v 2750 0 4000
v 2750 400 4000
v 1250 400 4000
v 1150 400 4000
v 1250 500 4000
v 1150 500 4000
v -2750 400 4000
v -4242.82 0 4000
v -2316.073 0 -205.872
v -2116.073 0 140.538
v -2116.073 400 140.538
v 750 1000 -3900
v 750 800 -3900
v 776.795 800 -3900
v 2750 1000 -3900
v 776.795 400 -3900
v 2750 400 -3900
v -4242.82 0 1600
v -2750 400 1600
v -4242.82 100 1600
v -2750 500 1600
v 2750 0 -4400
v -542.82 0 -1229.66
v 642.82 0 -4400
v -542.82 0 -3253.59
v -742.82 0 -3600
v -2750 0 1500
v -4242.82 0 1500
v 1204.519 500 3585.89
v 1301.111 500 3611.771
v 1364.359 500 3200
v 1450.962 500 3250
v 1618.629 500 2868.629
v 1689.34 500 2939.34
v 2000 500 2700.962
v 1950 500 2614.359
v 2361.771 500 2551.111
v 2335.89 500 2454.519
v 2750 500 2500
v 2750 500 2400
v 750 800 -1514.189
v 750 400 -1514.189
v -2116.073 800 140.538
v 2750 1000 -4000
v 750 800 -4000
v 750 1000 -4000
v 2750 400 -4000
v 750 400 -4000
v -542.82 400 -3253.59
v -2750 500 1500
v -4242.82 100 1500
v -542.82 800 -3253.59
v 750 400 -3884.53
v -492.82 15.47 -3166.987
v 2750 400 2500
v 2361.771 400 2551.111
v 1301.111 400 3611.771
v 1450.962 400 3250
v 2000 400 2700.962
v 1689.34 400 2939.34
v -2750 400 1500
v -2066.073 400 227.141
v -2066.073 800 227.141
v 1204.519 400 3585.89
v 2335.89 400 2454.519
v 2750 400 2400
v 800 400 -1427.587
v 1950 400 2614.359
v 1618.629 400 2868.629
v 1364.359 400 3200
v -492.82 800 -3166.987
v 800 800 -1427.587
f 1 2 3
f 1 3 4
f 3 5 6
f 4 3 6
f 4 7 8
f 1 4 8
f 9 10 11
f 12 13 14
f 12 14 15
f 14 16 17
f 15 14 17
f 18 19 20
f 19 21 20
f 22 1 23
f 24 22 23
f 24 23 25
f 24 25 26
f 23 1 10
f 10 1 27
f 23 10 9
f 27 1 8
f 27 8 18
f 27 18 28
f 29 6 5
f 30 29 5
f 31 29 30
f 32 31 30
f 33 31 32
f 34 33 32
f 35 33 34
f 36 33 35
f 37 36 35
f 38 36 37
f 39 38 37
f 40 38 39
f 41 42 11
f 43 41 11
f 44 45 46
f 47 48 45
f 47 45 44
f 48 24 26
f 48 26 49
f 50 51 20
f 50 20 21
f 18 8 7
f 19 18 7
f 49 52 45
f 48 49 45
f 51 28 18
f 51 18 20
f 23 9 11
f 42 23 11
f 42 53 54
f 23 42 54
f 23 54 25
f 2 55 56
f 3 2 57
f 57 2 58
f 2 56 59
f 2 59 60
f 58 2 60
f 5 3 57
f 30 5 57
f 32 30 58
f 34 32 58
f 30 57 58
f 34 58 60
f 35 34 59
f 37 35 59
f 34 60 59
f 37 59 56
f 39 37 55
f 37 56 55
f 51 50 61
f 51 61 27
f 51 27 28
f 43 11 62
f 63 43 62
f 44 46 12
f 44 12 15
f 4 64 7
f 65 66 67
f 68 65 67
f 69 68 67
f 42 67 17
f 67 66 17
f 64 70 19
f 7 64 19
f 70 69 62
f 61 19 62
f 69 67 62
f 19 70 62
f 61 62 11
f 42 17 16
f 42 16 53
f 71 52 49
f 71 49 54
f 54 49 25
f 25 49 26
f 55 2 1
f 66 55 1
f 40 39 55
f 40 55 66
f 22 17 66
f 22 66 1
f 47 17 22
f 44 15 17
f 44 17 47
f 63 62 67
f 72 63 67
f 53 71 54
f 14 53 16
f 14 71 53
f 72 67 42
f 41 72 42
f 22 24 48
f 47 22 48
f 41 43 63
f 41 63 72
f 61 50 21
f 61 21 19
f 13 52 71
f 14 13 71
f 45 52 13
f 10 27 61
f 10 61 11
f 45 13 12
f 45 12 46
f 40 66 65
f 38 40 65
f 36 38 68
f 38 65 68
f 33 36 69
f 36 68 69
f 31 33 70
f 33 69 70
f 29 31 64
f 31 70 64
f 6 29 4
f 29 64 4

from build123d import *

# Parameters (mm, degrees)
EXTRUDE_1_DEPTH              = 400
EXTRUDE_2_DEPTH              = 100
SKETCH_3_W                   = 2000
SKETCH_3_H                   = 100
EXTRUDE_3_DEPTH              = 600
EXTRUDE_4_DEPTH              = 400
EXTRUDE_5_DEPTH              = 2500
EXTRUDE_6_DEPTH              = 100
EXTRUDE_7_REACH              = 6699.625
EXTRUDE_8_REACH              = 9240.058
EXTRUDE_10_REACH             = 8119.853
EXTRUDE_11_DEPTH             = 1492.820323
EXTRUDE_11_DIRECTION_2_REACH = 8492.6
SKETCH_12_W                  = 1492.820323027
SKETCH_12_H                  = 800
EXTRUDE_12_DEPTH             = 100


with BuildPart() as part:
    # 草图1 → 凸台-拉伸1 (new body)
    with BuildSketch(Plane(origin=(0, 0, 0), x_dir=(1, 0, 0), z_dir=(0, 1, 0))):
        Polygon((-2750, -1500), (-2116.072607389, -140.538319445), (750, 1514.189471948), (750, 4000), (2750, 4000), (2750, -4000), (-2750, -4000), align=None)
    extrude(amount=EXTRUDE_1_DEPTH)

    # 草图2 → 凸台-拉伸2 (add)
    with BuildSketch(Plane(origin=(0, 400, 0), x_dir=(1, 0, 0), z_dir=(0, 1, 0))):
        with BuildLine():
            Line((1150, -4000), (1250, -4000))
            ThreePointArc((1250, -4000), (1689.33982822, -2939.33982822), (2750, -2500))
            Line((2750, -2500), (2750, -2400))
            ThreePointArc((2750, -2400), (1618.629150102, -2868.629150102), (1150, -4000))
        make_face()
    extrude(amount=EXTRUDE_2_DEPTH)

    # 草图3 → 凸台-拉伸3 (add)
    with BuildSketch(Plane(origin=(0, 400, 0), x_dir=(1, 0, 0), z_dir=(0, 1, 0))):
        with Locations((1750, 3950)):
            Rectangle(SKETCH_3_W, SKETCH_3_H)
    extrude(amount=EXTRUDE_3_DEPTH)

    # 草图4 → 凸台-拉伸4 (add)
    with BuildSketch(Plane(origin=(0, 400, 0), x_dir=(1, 0, 0), z_dir=(0, 1, 0))):
        Polygon((750, 1514.189471948), (-2116.072607389, -140.538319445), (-2066.072607389, -227.140859823), (800, 1427.58693157), align=None)
    extrude(amount=EXTRUDE_4_DEPTH)

    # 草图5 → 凸台-拉伸5 (add)
    with BuildSketch(Plane.XY.offset(4000)):
        Polygon((-2750, 400), (-2750, 0), (-4242.820323028, 0), align=None)
    extrude(amount=-EXTRUDE_5_DEPTH)

    # 草图6 → 凸台-拉伸6 (add)
    with BuildSketch(Plane(origin=(0, 0, 1500), x_dir=(-1, 0, 0), z_dir=(0, 0, -1))):
        Polygon((2750, 400), (4242.820323028, 0), (4242.820323028, 100), (2750, 500), align=None)
    extrude(amount=-EXTRUDE_6_DEPTH)

    # 凸台-拉伸7: up to this plane
    extrude_7_end = Plane(origin=(750, 400, -1514.189471948), z_dir=(1, 0, 0))
    # 草图7 → 凸台-拉伸7 (add, up to the surface)
    with BuildSketch(Plane(origin=(-1647.909332964, 0, 951.420896987), x_dir=(0.4999999999999981, 0, 0.8660254037844398), z_dir=(-0.8660254037844398, 0, 0.49999999999999817)), mode=Mode.PRIVATE) as extrude_7_sk1:
        Polygon((-936.32654885, 0), (-1336.32654885, 0), (-936.32654885, 400), align=None)
    extrude_7_tool1 = split(extrude(extrude_7_sk1.sketch, amount=-EXTRUDE_7_REACH, mode=Mode.PRIVATE), bisect_by=extrude_7_end, keep=Keep.BOTH, mode=Mode.PRIVATE)
    add(extrude_7_tool1.solids().sort_by_distance((-2182.739274, 133.333333, 25.068266))[0])

    # 凸台-拉伸8: up to this plane
    extrude_8_end = Plane(origin=(499800, 0, -290102.721526381), z_dir=(-0.3535533905932706, 0.7071067811865511, -0.6123724356957922))
    # 草图8 → 凸台-拉伸8 (add, up to the surface)
    with BuildSketch(Plane(origin=(-1544.550807569, 0, -2675.240473581), x_dir=(0, -1, 0), z_dir=(0.49999999999999495, 0, 0.8660254037844416)), mode=Mode.PRIVATE) as extrude_8_sk1:
        Polygon((0, 2649.519052838), (-400, 2649.519052838), (0, 1156.698729811), align=None)
    extrude_8_tool1 = split(extrude(extrude_8_sk1.sketch, amount=EXTRUDE_8_REACH, dir=(0, 0, 1), mode=Mode.PRIVATE), bisect_by=extrude_8_end, keep=Keep.BOTH, mode=Mode.PRIVATE)
    add(extrude_8_tool1.solids().sort_by_distance((319.059892, 133.333333, -3751.196613))[0])

    # 凸台-拉伸10: up to this plane
    extrude_10_end = Plane(origin=(1699.759526419, 0, -455.449192431), z_dir=(-0.96592582628907, 0, 0.25881904510251463))
    # 草图9 → 凸台-拉伸10 (add, up to the surface)
    with BuildSketch(Plane(origin=(2750, 0, 0), x_dir=(0, 0, -1), z_dir=(1, 0, 0)), mode=Mode.PRIVATE) as extrude_10_sk1:
        Polygon((4000, 0), (4400, 0), (4000, 400), align=None)
    extrude_10_tool1 = split(extrude(extrude_10_sk1.sketch, amount=-EXTRUDE_10_REACH, mode=Mode.PRIVATE), bisect_by=extrude_10_end, keep=Keep.BOTH, mode=Mode.PRIVATE)
    add(extrude_10_tool1.solids().sort_by_distance((2750, 133.333333, -4133.333333))[0])

    # 草图11 → 凸台-拉伸11 (add)
    with BuildSketch(Plane(origin=(2294.550807569, 0, -1324.759526419), x_dir=(0, 1, 0), z_dir=(-0.8660254037844416, 0, 0.49999999999999506))):
        Polygon((400, 3089.101615138), (0, 3089.101615138), (0, 3489.101615138), align=None)
    extrude(amount=EXTRUDE_11_DEPTH)

    # 凸台-拉伸11 direction 2: up to this face of the body (flat: up to its plane)
    extrude_11_direction_2_end = Plane(part.part.faces().sort_by_distance((714.273441009, 133.333333333, -4133.333333333))[0])
    # 草图11 → 凸台-拉伸11 direction 2 (add, up to the picked face)
    with BuildSketch(Plane(origin=(2294.550807569, 0, -1324.759526419), x_dir=(0, 1, 0), z_dir=(-0.8660254037844416, 0, 0.49999999999999506)), mode=Mode.PRIVATE) as extrude_11_direction_2_sk1:
        Polygon((400, 3089.101615138), (0, 3089.101615138), (0, 3489.101615138), align=None)
    extrude_11_direction_2_tool1 = split(extrude(extrude_11_direction_2_sk1.sketch, amount=-EXTRUDE_11_DIRECTION_2_REACH, mode=Mode.PRIVATE), bisect_by=extrude_11_direction_2_end, keep=Keep.BOTH, mode=Mode.PRIVATE)
    add(extrude_11_direction_2_tool1.solids().sort_by(Axis((683.333333, 133.333333, -4115.470054), (0.8660254037844416, 0, -0.49999999999999506)))[0])

    # 草图12 → 凸台-拉伸12 (add)
    with BuildSketch(Plane(origin=(-1544.550807569, 0, -2675.240473581), x_dir=(0.8660254037844417, 0, -0.49999999999999495), z_dir=(0.49999999999999495, 0, 0.8660254037844417))):
        with Locations((1903.108891325, 400)):
            Rectangle(SKETCH_12_W, SKETCH_12_H)
    extrude(amount=EXTRUDE_12_DEPTH)


solid = part.part
